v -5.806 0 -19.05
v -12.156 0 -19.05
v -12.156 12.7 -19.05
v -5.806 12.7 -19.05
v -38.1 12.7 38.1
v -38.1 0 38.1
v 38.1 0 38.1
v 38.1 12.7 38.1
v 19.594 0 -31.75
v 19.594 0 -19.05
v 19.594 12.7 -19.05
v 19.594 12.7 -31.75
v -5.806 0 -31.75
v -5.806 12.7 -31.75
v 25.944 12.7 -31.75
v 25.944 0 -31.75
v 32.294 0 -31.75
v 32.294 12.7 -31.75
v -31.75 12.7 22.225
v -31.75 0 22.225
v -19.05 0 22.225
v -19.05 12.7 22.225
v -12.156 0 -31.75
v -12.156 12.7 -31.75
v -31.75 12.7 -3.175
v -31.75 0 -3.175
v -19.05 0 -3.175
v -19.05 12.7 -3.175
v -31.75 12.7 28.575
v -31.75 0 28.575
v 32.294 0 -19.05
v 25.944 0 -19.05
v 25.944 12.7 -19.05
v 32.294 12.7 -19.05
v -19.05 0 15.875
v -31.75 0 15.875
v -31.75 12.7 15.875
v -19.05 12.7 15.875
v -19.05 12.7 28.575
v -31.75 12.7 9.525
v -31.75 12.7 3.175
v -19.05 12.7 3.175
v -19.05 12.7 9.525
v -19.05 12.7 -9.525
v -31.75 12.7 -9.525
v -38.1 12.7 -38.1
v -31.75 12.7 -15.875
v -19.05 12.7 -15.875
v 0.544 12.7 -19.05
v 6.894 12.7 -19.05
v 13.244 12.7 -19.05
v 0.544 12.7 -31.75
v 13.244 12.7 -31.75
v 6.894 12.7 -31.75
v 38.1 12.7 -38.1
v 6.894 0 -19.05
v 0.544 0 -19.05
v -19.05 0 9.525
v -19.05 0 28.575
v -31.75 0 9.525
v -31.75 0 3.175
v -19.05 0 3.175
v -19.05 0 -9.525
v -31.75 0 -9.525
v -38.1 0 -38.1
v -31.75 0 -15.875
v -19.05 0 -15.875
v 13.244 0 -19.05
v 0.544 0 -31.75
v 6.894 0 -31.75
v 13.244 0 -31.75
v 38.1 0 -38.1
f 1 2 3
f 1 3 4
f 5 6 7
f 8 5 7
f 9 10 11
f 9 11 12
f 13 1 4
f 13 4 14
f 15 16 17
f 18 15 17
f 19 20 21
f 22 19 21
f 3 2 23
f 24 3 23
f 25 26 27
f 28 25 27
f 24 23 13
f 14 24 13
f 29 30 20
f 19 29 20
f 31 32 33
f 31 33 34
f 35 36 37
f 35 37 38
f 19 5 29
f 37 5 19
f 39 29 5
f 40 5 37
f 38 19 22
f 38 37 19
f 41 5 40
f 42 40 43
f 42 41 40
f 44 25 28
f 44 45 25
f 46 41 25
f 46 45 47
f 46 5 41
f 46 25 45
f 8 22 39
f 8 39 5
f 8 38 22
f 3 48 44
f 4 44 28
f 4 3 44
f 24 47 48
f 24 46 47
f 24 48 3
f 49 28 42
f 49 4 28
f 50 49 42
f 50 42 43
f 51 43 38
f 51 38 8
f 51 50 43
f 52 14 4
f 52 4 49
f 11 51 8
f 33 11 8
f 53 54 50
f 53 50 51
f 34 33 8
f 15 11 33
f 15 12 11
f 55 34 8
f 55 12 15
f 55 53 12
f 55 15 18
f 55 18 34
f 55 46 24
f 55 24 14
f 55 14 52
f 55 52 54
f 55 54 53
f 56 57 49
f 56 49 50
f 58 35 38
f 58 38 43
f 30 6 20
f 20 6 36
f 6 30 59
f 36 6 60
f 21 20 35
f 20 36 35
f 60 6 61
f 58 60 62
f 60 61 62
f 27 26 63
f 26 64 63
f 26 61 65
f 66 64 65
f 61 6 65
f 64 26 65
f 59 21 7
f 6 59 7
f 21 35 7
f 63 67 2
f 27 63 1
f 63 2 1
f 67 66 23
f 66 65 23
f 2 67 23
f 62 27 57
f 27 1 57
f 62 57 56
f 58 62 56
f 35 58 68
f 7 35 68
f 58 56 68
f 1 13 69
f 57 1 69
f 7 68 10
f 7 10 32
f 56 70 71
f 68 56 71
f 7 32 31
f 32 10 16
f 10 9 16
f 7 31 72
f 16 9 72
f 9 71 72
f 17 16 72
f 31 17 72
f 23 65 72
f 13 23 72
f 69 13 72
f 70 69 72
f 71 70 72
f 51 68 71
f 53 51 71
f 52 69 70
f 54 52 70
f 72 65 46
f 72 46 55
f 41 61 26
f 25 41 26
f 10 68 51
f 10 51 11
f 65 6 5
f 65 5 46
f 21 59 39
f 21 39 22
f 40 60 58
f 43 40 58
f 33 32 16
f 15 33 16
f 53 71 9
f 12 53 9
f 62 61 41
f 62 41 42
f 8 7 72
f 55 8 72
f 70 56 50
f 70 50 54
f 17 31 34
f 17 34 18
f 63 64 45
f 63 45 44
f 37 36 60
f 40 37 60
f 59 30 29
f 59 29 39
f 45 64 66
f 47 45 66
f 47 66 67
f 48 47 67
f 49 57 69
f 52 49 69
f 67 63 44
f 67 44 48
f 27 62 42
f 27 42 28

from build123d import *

# Parameters (mm, degrees)
SKETCH1_W           = 76.2
SKETCH1_H           = 76.2
SKETCH1_W_2         = 12.7
SKETCH1_H_2         = 6.35
SKETCH1_W_3         = 6.35
SKETCH1_H_3         = 12.7
BOSS_EXTRUDE1_DEPTH = 12.7


with BuildPart() as part:
    # Sketch1 → Boss-Extrude1 (new body)
    with BuildSketch(Plane(origin=(0, 0, 0), x_dir=(1, 0, 0), z_dir=(0, 1, 0))):
        Rectangle(SKETCH1_W, SKETCH1_H)
        with Locations((-25.4, 0)):
            Rectangle(SKETCH1_W_2, SKETCH1_H_2, mode=Mode.SUBTRACT)
        with Locations((-25.4, 12.7)):
            Rectangle(SKETCH1_W_2, SKETCH1_H_2, mode=Mode.SUBTRACT)
        with Locations((-25.4, -12.7)):
            Rectangle(SKETCH1_W_2, SKETCH1_H_2, mode=Mode.SUBTRACT)
        with Locations((-25.4, -25.4)):
            Rectangle(SKETCH1_W_2, SKETCH1_H_2, mode=Mode.SUBTRACT)
        with Locations((3.719341062, 25.4)):
            Rectangle(SKETCH1_W_3, SKETCH1_H_3, mode=Mode.SUBTRACT)
        with Locations((-8.980658938, 25.4)):
            Rectangle(SKETCH1_W_3, SKETCH1_H_3, mode=Mode.SUBTRACT)
        with Locations((16.419341062, 25.4)):
            Rectangle(SKETCH1_W_3, SKETCH1_H_3, mode=Mode.SUBTRACT)
        with Locations((29.119341062, 25.4)):
            Rectangle(SKETCH1_W_3, SKETCH1_H_3, mode=Mode.SUBTRACT)
    extrude(amount=BOSS_EXTRUDE1_DEPTH)


solid = part.part
